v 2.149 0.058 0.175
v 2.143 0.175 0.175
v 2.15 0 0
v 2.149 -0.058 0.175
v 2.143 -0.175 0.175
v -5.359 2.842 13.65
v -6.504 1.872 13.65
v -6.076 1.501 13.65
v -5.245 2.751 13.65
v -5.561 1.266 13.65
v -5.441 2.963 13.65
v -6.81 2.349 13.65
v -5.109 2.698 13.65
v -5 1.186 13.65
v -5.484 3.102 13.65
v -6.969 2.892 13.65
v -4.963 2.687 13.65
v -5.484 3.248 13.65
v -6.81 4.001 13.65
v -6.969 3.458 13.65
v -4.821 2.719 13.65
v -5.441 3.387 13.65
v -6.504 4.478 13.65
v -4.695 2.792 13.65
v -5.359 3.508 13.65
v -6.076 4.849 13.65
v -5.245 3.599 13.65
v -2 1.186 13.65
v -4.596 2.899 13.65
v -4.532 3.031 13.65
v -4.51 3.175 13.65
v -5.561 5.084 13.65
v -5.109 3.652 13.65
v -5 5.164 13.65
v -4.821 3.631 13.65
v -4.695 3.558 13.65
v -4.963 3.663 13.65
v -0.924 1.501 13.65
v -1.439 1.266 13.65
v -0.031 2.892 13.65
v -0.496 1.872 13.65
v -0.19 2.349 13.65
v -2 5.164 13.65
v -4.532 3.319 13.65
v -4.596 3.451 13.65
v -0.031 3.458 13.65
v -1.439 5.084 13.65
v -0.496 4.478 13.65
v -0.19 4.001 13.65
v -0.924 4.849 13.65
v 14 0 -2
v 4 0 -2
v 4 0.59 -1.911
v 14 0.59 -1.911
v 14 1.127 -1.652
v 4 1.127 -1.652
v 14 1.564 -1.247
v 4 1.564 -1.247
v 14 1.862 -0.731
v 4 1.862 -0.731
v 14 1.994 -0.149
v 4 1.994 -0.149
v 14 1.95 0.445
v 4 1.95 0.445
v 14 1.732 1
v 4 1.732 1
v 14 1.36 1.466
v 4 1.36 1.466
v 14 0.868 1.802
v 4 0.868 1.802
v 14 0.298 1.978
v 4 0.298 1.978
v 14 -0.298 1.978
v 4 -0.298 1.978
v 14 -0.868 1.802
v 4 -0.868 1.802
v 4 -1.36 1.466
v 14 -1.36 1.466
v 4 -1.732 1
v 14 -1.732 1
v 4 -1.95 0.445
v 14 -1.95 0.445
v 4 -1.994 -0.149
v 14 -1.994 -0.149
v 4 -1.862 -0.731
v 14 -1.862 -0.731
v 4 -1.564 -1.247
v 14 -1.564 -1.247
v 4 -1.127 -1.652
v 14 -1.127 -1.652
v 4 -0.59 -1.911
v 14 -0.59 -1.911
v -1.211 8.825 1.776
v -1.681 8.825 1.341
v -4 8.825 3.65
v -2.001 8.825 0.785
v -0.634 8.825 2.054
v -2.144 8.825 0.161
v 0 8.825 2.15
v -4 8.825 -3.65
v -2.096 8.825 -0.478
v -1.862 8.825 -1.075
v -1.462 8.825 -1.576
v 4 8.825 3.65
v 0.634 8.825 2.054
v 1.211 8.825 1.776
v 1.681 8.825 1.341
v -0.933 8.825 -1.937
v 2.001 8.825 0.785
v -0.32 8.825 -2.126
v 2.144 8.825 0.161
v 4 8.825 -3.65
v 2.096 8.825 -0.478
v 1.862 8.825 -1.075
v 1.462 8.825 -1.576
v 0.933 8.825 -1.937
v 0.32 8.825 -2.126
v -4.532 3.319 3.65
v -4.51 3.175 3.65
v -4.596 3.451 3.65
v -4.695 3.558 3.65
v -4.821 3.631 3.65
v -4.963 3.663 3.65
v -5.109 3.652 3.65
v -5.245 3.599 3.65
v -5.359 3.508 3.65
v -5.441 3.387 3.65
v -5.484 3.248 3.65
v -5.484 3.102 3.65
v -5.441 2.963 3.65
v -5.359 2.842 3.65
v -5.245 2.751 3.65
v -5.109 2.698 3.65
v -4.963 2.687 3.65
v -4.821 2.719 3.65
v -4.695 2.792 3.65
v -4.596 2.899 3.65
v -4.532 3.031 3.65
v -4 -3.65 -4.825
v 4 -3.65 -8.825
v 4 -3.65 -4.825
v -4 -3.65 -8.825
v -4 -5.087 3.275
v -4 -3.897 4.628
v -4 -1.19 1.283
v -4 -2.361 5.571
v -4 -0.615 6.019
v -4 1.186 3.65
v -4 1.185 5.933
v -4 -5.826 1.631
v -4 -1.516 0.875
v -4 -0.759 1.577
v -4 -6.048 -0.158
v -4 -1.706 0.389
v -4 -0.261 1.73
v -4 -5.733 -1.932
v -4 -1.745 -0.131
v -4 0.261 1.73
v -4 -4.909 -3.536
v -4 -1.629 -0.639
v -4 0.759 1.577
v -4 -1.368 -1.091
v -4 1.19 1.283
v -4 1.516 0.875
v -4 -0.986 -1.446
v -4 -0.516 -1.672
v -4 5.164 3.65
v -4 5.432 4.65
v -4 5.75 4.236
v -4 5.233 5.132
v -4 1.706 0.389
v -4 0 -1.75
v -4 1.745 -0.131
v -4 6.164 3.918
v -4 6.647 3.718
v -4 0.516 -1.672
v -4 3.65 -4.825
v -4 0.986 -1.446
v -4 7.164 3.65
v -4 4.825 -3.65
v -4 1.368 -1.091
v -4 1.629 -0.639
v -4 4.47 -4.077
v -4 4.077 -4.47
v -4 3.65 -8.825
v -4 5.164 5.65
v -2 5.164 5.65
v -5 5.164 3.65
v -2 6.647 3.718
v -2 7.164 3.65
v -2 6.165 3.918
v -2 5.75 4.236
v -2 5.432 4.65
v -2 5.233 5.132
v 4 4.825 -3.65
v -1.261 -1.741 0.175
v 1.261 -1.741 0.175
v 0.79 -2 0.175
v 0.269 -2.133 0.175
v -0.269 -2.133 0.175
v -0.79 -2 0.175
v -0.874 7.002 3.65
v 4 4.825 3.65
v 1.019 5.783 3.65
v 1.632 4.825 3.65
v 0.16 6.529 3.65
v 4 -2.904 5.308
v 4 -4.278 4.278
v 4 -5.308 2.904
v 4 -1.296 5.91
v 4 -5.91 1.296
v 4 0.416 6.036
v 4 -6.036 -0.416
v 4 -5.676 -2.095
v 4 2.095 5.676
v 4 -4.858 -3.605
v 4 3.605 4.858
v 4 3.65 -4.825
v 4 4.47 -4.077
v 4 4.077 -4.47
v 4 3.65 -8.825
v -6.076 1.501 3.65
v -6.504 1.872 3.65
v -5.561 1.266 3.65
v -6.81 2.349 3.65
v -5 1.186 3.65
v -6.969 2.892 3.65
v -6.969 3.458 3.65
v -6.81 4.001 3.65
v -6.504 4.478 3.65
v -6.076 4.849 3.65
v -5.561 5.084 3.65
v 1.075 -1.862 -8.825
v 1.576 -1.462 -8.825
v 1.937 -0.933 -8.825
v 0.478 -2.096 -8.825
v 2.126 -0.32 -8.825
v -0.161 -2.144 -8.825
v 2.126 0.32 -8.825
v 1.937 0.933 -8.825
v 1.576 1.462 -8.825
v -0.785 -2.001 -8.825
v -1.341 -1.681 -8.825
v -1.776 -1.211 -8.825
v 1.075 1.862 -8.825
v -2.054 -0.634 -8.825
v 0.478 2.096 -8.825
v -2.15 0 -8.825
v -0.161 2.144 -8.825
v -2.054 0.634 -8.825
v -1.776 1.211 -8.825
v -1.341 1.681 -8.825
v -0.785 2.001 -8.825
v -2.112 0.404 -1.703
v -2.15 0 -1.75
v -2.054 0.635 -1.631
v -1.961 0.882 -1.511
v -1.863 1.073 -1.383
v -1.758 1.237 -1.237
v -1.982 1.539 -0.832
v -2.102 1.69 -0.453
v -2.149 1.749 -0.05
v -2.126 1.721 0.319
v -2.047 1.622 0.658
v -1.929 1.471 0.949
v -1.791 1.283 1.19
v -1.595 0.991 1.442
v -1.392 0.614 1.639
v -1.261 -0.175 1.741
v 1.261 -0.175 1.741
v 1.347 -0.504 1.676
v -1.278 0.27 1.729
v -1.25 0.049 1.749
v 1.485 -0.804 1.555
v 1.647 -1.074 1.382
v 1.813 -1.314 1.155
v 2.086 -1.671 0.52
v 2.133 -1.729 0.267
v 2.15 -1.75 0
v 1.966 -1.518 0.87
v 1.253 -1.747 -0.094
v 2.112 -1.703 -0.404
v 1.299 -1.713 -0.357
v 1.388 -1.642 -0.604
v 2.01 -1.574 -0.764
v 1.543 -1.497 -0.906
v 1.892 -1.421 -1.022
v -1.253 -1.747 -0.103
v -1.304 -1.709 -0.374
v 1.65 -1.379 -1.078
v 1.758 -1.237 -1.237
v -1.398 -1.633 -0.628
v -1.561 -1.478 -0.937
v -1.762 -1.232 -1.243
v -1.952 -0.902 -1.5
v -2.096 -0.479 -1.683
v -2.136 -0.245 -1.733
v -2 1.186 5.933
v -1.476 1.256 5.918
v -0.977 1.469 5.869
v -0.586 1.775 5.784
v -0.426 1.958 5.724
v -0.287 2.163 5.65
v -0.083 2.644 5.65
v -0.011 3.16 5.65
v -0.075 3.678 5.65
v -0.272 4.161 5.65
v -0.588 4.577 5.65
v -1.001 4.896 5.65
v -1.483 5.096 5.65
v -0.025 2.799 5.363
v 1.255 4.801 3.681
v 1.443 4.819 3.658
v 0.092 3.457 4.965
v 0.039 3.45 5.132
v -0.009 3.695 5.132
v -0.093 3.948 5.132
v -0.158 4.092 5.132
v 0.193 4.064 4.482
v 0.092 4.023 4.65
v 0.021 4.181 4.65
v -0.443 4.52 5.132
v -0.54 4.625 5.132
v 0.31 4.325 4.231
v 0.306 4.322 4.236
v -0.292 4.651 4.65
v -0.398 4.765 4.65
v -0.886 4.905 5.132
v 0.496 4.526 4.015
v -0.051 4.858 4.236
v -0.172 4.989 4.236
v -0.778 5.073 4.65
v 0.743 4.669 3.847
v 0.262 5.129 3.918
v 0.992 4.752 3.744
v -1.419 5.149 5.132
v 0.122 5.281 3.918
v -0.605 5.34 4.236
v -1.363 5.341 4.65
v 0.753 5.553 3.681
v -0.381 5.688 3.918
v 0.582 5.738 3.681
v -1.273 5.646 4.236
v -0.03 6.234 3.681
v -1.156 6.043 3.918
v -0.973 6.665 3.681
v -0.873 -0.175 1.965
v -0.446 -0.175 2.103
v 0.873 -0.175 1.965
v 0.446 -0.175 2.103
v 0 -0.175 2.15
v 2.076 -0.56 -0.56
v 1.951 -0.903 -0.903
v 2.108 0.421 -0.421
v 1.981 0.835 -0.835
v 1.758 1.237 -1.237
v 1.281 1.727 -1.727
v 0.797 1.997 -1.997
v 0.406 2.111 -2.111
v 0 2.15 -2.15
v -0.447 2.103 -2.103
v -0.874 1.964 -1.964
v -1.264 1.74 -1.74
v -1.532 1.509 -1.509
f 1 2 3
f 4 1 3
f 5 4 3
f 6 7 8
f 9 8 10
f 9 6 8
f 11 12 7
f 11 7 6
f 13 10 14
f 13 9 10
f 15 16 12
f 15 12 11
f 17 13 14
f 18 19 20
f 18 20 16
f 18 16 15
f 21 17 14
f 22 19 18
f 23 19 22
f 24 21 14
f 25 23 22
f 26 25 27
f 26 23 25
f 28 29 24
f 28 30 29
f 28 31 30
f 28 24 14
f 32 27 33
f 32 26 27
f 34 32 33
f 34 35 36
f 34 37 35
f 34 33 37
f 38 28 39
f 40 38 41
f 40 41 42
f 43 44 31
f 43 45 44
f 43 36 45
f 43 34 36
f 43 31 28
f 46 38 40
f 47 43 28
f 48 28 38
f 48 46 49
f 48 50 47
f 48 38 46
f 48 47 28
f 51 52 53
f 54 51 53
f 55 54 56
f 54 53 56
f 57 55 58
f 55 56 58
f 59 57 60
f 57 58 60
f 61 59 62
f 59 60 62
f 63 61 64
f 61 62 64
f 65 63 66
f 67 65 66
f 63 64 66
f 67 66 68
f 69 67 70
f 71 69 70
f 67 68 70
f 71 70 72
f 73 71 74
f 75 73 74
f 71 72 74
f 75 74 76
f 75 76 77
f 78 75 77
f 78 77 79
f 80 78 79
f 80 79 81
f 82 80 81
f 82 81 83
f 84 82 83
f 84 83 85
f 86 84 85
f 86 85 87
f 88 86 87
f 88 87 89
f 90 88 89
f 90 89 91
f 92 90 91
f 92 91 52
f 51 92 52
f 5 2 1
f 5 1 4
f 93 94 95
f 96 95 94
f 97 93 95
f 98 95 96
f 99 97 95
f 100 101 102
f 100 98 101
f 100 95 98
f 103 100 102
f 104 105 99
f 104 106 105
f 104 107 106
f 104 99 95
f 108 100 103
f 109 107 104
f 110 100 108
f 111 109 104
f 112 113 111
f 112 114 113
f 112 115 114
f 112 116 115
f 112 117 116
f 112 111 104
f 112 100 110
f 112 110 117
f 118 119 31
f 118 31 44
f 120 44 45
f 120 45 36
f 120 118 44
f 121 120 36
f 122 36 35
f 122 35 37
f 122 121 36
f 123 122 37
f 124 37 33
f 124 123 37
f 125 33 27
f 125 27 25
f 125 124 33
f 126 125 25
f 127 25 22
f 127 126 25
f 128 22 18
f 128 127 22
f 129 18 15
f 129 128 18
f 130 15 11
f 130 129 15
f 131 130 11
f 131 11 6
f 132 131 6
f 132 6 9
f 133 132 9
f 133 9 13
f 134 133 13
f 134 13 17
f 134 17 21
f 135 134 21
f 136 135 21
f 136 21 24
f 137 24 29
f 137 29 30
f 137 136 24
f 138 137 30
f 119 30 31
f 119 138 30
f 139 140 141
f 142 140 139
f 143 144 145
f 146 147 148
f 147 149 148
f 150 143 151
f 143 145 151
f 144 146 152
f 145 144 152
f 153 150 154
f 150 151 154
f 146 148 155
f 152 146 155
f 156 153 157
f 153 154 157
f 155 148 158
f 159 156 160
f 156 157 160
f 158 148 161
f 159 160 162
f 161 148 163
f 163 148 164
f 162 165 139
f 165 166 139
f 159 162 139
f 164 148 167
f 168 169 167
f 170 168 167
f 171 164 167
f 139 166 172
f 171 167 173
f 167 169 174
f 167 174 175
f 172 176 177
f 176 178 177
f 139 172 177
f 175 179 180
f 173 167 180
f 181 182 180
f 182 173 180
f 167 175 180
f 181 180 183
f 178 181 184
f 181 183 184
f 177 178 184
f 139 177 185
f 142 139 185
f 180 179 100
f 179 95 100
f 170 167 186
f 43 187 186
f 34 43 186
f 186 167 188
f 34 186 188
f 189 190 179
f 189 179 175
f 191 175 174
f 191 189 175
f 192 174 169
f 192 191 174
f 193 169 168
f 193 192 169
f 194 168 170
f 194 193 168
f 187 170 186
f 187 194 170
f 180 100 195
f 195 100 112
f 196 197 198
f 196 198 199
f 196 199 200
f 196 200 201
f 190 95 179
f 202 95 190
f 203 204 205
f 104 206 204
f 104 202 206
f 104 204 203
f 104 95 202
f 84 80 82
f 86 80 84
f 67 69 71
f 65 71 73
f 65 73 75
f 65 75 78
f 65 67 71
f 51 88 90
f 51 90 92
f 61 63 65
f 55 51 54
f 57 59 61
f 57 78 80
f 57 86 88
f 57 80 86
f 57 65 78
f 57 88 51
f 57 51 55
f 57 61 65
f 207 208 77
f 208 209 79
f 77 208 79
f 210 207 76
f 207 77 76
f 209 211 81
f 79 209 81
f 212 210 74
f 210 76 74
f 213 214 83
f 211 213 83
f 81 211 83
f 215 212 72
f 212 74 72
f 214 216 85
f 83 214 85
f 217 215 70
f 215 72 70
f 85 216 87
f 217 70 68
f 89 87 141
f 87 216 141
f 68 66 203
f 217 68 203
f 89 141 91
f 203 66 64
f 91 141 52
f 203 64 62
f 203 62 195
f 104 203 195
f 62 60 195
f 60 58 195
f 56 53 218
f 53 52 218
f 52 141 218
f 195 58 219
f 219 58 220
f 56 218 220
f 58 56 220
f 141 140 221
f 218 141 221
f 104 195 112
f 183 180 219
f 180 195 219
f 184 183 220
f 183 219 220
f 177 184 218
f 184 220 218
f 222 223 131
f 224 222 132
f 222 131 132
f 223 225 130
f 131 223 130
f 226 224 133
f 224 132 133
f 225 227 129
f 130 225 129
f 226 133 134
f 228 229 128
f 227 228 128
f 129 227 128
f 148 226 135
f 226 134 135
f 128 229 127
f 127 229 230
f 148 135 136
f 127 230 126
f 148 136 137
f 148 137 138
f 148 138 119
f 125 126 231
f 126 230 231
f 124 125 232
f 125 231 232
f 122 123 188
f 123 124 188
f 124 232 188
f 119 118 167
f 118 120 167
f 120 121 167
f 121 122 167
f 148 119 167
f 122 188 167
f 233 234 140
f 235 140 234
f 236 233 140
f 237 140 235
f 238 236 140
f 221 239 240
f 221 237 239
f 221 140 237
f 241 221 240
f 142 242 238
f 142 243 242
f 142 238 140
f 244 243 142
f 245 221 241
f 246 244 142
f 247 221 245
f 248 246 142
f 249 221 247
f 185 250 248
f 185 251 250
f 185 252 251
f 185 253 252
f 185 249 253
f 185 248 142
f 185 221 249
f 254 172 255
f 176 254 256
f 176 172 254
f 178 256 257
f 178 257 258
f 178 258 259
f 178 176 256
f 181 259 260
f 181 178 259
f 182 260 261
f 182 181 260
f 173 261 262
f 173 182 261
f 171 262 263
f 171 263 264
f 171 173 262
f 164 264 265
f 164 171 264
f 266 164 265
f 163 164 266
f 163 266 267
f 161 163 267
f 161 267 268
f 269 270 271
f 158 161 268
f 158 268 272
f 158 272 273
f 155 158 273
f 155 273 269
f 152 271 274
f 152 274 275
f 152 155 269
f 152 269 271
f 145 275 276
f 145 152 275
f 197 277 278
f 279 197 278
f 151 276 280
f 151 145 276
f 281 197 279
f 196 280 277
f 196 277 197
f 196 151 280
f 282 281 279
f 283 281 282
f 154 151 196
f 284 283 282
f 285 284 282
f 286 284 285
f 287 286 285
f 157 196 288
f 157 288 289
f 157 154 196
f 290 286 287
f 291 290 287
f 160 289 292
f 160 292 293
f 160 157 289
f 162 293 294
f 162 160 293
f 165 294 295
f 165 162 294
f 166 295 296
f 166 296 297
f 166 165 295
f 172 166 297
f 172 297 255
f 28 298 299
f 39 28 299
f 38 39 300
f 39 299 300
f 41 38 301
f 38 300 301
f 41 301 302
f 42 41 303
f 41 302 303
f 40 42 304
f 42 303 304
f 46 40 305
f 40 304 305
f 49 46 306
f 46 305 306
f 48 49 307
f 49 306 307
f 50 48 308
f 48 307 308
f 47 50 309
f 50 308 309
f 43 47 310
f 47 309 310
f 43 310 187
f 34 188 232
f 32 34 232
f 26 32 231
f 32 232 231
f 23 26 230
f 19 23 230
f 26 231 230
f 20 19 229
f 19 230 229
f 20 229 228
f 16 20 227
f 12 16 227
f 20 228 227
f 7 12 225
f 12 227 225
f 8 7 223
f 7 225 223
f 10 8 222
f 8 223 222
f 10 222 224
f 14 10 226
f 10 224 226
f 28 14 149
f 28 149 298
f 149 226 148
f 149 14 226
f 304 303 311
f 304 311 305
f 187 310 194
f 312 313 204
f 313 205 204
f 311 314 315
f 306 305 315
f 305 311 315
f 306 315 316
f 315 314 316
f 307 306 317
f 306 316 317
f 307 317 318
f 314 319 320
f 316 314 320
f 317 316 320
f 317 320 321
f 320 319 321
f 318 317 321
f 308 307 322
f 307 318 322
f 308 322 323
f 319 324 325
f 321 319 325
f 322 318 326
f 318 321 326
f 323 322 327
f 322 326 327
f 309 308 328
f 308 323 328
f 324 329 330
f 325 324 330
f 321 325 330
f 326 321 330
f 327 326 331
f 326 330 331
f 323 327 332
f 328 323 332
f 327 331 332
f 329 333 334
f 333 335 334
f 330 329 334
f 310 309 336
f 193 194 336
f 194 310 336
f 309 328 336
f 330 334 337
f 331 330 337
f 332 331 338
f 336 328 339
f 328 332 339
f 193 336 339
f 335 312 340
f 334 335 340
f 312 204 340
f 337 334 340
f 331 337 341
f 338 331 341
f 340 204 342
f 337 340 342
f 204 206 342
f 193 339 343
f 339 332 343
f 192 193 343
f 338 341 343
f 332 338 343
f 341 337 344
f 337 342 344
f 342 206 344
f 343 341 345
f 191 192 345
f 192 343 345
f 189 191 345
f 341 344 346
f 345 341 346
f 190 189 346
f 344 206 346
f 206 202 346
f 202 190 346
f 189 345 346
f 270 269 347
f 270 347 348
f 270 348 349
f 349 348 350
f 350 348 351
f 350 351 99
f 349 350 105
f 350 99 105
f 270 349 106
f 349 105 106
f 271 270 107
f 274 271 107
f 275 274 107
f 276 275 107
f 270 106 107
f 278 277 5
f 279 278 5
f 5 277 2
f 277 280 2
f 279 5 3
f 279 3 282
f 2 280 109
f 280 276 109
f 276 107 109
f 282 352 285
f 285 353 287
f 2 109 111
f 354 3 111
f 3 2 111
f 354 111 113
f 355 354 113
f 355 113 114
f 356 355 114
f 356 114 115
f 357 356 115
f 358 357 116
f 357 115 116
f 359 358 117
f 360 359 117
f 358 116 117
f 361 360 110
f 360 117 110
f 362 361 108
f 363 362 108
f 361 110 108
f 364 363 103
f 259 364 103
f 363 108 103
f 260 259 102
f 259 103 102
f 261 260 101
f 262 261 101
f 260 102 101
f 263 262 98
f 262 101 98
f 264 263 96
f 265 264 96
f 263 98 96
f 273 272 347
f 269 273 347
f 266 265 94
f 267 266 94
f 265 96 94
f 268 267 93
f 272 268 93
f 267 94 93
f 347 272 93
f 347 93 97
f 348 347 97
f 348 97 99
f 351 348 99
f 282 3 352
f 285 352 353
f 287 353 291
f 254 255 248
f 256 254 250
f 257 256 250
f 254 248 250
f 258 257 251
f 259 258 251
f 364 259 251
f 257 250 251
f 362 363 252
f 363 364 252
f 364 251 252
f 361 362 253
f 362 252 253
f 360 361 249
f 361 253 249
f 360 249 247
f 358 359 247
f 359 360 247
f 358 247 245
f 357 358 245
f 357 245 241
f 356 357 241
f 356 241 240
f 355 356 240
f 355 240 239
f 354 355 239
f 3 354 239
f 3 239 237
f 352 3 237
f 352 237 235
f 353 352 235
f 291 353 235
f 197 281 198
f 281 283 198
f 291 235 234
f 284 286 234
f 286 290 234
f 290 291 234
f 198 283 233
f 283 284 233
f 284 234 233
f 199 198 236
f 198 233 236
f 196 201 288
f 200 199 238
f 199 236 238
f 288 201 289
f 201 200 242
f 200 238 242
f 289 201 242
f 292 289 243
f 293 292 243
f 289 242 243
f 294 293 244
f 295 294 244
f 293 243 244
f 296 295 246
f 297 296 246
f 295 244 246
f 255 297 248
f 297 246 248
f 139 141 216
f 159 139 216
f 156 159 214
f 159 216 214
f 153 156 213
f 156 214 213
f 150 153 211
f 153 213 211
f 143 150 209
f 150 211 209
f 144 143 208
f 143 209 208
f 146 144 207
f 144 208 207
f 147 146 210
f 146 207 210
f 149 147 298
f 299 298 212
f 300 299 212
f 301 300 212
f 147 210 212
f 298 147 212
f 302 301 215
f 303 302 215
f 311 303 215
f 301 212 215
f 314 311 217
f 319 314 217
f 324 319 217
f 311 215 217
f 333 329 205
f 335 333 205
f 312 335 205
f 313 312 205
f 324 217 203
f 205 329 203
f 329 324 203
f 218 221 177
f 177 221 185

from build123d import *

# Parameters (mm, degrees)
SKETCH1_R               = 1.75
BOSS_EXTRUDE1_DEPTH     = 4
SKETCH2_R               = 2.15
CUT_EXTRUDE1_DEPTH      = 5
BOSS_EXTRUDE5_START     = -1.8499999
BOSS_EXTRUDE5_OUTLINE_R = 2
BOSS_EXTRUDE5_DEPTH     = 11.8499999
BOSS_EXTRUDE5_START_2   = -3
BOSS_EXTRUDE5_2_DEPTH   = 7.824935333
SKETCH3_R               = 2.15
CUT_EXTRUDE2_DEPTH      = 5
BOSS_EXTRUDE2_START     = 4
SKETCH4_W               = 8
SKETCH4_H               = 7.3
SKETCH4_R               = 2.15
BOSS_EXTRUDE2_DEPTH     = 4
BOSS_EXTRUDE3_START     = 4
SKETCH5_W               = 8
SKETCH5_H               = 7.3
SKETCH5_R               = 2.15
BOSS_EXTRUDE3_DEPTH     = 4
SKETCH6_R               = 0.4895
BOSS_EXTRUDE4_DEPTH     = 10
FILLET1_R               = 2


with BuildPart() as part:
    # Sketch1 → Boss-Extrude1 (new, symmetric)
    with BuildSketch(Plane(origin=(0, 0, 0), x_dir=(0, 0, -1), z_dir=(1, 0, 0))):
        with BuildLine():
            Line((-3.65, 4.824935233), (3.65, 4.824935233))
            ThreePointArc((3.65, 4.824935233), (4.277996026, 4.277996026), (4.824935233, 3.65))
            Line((4.824935233, 3.65), (4.824935233, -3.65))
            ThreePointArc((4.824935233, -3.65), (-4.277996026, -4.277996026), (-3.65, 4.824935233))
        make_face()
        Circle(SKETCH1_R, mode=Mode.SUBTRACT)
    extrude(amount=BOSS_EXTRUDE1_DEPTH, both=True)

    # Sketch2 → Cut-Extrude1 (cut)
    with BuildSketch(Plane(origin=(0, 4.824935233, 0), x_dir=(1, 0, 0), z_dir=(0, 1, 0))):
        with Locations(Location((0, 0, 0), (0, 0, 270))):
            Circle(SKETCH2_R)
    extrude(amount=-CUT_EXTRUDE1_DEPTH, mode=Mode.SUBTRACT)

    # Boss-Extrude5: read off the stored shape, not the designer's step
    # Boss-Extrude5 outline → Boss-Extrude5 (add)
    with BuildSketch(Plane(origin=(4, 0, 0), x_dir=(0, 0, -1), z_dir=(1, 0, 0)).offset(BOSS_EXTRUDE5_START)):
        Circle(BOSS_EXTRUDE5_OUTLINE_R)
    extrude(amount=BOSS_EXTRUDE5_DEPTH)

    # Boss-Extrude5 2 outline → Boss-Extrude5 2 (add)
    with BuildSketch(Plane(origin=(0, 0, 0), x_dir=(1, 0, 0), z_dir=(0, 1, 0)).offset(BOSS_EXTRUDE5_START_2)):
        with BuildLine():
            Line((2.1500001, -3), (2.15, 0))
            ThreePointArc((2.15, 0), (1.52027958, -1.52027958), (0, -2.15))
            Line((0, -2.15), (0, -3))
            Line((0, -3), (2.1500001, -3))
        make_face()
        with BuildLine():
            ThreePointArc((0, 2.15), (1.52027958, 1.52027958), (2.15, 0))
            Line((2.15, 0), (2.1500001, 3))
            Line((2.1500001, 3), (0, 3))
            Line((0, 3), (0, 2.15))
        make_face()
    extrude(amount=BOSS_EXTRUDE5_2_DEPTH)

    # Sketch3 → Cut-Extrude2 (cut)
    with BuildSketch(Plane(origin=(0, 0, -4.824935233), x_dir=(-1, 0, 0), z_dir=(0, 0, -1))):
        Circle(SKETCH3_R)
    extrude(amount=-CUT_EXTRUDE2_DEPTH, mode=Mode.SUBTRACT)

    # Sketch4 → Boss-Extrude2 (add)
    with BuildSketch(Plane(origin=(0, 4.824935233, 0), x_dir=(1, 0, 0), z_dir=(0, 1, 0)).offset(BOSS_EXTRUDE2_START)):
        Rectangle(SKETCH4_W, SKETCH4_H)
        with Locations(Location((0, 0, 0), (0, 0, 270))):
            Circle(SKETCH4_R, mode=Mode.SUBTRACT)
    extrude(amount=-BOSS_EXTRUDE2_DEPTH)

    # Sketch5 → Boss-Extrude3 (add)
    with BuildSketch(Plane(origin=(0, 0, -4.824935233), x_dir=(-1, 0, 0), z_dir=(0, 0, -1)).offset(BOSS_EXTRUDE3_START)):
        Rectangle(SKETCH5_W, SKETCH5_H)
        Circle(SKETCH5_R, mode=Mode.SUBTRACT)
    extrude(amount=-BOSS_EXTRUDE3_DEPTH)

    # Sketch6 → Boss-Extrude4 (add)
    with BuildSketch(Plane.XY.offset(3.65)):
        with BuildLine():
            Line((-2, 5.1645), (-5, 5.1645))
            ThreePointArc((-5, 5.1645), (-6.9895, 3.175), (-5, 1.1855))
            Line((-5, 1.1855), (-2, 1.1855))
            ThreePointArc((-2, 1.1855), (-0.0105, 3.175), (-2, 5.1645))
        make_face()
        with Locations((-5, 3.175)):
            Circle(SKETCH6_R, mode=Mode.SUBTRACT)
    extrude(amount=BOSS_EXTRUDE4_DEPTH)

    # Fillet1
    # the kernel refuses this fillet: 2 mm, written as the material it adds along each edge
    with BuildSketch(Plane(origin=(-2, 3.175, 3.65), x_dir=(0.03534330894551541, -0.9993752300876693, 0), z_dir=(-0.9993752300876693, -0.03534330894551541, 0))) as fillet1_piece_1:
        with BuildLine():
            CenterArc((1.9895 + FILLET1_R, FILLET1_R), FILLET1_R, 180, 90)
            Line((1.9895 + FILLET1_R, 0), (1.9895, 0))
            Line((1.9895, 0), (1.9895, FILLET1_R))
        make_face()
    revolve(axis=Axis((-2, 3.175, 3.65), (0, 0, 1)), revolution_arc=177.974555734)
    with BuildSketch(Plane(origin=(-2, 5.1645, 3.65), x_dir=(0, 0, 1), z_dir=(-1, 0, 0))) as fillet1_piece_2:
        with BuildLine():
            CenterArc((FILLET1_R, FILLET1_R), FILLET1_R, 180, 90)
            Line((0, FILLET1_R), (0, 0))
            Line((0, 0), (FILLET1_R, 0))
        make_face()
    extrude(amount=2)


solid = part.part
